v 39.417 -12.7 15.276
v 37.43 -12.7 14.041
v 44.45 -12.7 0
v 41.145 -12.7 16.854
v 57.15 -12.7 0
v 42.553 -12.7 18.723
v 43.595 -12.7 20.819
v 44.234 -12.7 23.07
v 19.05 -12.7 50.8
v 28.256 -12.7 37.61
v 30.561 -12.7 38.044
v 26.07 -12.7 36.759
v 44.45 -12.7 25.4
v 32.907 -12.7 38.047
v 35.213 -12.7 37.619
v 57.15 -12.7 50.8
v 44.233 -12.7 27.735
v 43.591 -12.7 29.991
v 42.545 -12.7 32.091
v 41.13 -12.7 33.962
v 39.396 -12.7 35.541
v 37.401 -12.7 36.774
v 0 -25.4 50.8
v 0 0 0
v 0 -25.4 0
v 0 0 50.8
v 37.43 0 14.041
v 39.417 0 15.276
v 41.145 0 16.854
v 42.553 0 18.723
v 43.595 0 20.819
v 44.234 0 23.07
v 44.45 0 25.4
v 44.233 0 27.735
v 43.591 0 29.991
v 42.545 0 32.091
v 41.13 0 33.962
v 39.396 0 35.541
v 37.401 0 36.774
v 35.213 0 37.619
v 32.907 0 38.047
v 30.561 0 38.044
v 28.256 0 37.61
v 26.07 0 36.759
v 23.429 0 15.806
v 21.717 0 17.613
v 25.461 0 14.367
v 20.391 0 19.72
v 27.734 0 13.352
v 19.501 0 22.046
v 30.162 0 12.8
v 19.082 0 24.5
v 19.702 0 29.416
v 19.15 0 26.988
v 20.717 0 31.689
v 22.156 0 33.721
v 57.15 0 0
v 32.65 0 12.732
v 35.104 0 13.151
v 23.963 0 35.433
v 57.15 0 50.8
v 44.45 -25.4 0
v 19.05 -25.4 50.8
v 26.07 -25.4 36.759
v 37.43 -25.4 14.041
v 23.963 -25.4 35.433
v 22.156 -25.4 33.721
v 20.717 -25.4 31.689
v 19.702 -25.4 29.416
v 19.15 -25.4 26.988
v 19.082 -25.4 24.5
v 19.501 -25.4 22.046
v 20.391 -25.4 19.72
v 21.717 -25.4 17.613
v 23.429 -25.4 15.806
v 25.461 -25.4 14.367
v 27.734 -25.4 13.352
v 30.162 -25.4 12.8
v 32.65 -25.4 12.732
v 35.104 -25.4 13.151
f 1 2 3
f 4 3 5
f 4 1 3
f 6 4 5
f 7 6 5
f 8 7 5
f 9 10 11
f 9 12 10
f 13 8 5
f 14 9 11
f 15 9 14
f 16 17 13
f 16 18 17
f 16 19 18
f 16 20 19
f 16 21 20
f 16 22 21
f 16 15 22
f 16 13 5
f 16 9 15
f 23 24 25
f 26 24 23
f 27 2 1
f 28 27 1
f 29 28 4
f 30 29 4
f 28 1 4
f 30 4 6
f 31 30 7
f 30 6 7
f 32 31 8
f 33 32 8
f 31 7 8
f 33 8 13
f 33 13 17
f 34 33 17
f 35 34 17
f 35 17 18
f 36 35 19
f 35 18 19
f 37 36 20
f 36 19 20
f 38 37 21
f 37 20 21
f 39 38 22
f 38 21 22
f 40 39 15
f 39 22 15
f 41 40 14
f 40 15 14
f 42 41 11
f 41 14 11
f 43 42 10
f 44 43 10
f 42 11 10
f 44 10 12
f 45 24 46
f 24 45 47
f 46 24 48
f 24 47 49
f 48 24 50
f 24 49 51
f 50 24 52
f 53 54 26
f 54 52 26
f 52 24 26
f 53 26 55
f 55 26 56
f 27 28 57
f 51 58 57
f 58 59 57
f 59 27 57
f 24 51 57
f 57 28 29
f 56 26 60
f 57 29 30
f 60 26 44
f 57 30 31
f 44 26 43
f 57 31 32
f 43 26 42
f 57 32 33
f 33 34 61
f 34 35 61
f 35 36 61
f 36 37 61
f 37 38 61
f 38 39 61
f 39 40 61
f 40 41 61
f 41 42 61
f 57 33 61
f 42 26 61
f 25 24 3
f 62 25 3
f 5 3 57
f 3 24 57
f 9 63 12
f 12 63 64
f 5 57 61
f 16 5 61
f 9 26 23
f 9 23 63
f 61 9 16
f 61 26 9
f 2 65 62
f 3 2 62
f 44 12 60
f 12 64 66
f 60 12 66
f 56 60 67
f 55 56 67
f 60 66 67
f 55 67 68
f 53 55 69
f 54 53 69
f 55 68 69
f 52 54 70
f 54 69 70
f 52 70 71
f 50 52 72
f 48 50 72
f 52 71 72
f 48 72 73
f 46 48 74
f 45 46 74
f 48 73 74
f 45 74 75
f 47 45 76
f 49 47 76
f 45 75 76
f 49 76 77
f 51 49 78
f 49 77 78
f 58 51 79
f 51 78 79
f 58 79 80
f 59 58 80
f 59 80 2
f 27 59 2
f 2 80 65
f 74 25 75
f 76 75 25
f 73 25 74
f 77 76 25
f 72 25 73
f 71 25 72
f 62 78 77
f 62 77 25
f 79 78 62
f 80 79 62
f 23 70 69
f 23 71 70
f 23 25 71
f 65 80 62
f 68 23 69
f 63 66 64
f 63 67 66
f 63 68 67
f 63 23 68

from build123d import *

# Parameters (mm, degrees)
F0_W     = 57.15
F0_H     = 50.8
F1_DEPTH = 25.4
F3_DEPTH = 12.7
F5_DEPTH = 25.4


# Not quite as in the source:
# - a feature of the source that left no trace in its solid (it failed there, or was rolled back) is left out


with BuildPart() as f1:
    # F0 (on Front) → F1 (new body)
    with BuildSketch(Plane.XZ):
        with Locations((28.575, 25.4)):
            Rectangle(F0_W, F0_H)
    extrude(amount=F1_DEPTH)

    # F2 (on face) → F3 (cut)
    with BuildSketch(Plane.XZ.offset(25.4)):
        Polygon((44.45, 0), (57.15, 0), (57.15, 50.8), (19.05, 50.8), align=None)
    extrude(amount=-F3_DEPTH, mode=Mode.SUBTRACT)

    # F4 (on face) → F5 (cut)
    with BuildSketch(Plane.XZ.offset(25.4)):
        with BuildLine():
            ThreePointArc((37.4296126628, 14.0407746743), (42.5532652661, 18.7232148761), (44.45, 25.4))
            ThreePointArc((44.45, 25.4), (38.4267851239, 36.2032652661), (26.0703873372, 36.7592253257))
            Line((26.0703873372, 36.7592253257), (37.4296126628, 14.0407746743))
        make_face()
        with BuildLine():
            Line((37.4296126628, 14.0407746743), (26.0703873372, 36.7592253257))
            ThreePointArc((26.0703873372, 36.7592253257), (20.3907746743, 19.7203873372), (37.4296126628, 14.0407746743))
        make_face()
    extrude(amount=-F5_DEPTH, mode=Mode.SUBTRACT)


solid = f1.part
